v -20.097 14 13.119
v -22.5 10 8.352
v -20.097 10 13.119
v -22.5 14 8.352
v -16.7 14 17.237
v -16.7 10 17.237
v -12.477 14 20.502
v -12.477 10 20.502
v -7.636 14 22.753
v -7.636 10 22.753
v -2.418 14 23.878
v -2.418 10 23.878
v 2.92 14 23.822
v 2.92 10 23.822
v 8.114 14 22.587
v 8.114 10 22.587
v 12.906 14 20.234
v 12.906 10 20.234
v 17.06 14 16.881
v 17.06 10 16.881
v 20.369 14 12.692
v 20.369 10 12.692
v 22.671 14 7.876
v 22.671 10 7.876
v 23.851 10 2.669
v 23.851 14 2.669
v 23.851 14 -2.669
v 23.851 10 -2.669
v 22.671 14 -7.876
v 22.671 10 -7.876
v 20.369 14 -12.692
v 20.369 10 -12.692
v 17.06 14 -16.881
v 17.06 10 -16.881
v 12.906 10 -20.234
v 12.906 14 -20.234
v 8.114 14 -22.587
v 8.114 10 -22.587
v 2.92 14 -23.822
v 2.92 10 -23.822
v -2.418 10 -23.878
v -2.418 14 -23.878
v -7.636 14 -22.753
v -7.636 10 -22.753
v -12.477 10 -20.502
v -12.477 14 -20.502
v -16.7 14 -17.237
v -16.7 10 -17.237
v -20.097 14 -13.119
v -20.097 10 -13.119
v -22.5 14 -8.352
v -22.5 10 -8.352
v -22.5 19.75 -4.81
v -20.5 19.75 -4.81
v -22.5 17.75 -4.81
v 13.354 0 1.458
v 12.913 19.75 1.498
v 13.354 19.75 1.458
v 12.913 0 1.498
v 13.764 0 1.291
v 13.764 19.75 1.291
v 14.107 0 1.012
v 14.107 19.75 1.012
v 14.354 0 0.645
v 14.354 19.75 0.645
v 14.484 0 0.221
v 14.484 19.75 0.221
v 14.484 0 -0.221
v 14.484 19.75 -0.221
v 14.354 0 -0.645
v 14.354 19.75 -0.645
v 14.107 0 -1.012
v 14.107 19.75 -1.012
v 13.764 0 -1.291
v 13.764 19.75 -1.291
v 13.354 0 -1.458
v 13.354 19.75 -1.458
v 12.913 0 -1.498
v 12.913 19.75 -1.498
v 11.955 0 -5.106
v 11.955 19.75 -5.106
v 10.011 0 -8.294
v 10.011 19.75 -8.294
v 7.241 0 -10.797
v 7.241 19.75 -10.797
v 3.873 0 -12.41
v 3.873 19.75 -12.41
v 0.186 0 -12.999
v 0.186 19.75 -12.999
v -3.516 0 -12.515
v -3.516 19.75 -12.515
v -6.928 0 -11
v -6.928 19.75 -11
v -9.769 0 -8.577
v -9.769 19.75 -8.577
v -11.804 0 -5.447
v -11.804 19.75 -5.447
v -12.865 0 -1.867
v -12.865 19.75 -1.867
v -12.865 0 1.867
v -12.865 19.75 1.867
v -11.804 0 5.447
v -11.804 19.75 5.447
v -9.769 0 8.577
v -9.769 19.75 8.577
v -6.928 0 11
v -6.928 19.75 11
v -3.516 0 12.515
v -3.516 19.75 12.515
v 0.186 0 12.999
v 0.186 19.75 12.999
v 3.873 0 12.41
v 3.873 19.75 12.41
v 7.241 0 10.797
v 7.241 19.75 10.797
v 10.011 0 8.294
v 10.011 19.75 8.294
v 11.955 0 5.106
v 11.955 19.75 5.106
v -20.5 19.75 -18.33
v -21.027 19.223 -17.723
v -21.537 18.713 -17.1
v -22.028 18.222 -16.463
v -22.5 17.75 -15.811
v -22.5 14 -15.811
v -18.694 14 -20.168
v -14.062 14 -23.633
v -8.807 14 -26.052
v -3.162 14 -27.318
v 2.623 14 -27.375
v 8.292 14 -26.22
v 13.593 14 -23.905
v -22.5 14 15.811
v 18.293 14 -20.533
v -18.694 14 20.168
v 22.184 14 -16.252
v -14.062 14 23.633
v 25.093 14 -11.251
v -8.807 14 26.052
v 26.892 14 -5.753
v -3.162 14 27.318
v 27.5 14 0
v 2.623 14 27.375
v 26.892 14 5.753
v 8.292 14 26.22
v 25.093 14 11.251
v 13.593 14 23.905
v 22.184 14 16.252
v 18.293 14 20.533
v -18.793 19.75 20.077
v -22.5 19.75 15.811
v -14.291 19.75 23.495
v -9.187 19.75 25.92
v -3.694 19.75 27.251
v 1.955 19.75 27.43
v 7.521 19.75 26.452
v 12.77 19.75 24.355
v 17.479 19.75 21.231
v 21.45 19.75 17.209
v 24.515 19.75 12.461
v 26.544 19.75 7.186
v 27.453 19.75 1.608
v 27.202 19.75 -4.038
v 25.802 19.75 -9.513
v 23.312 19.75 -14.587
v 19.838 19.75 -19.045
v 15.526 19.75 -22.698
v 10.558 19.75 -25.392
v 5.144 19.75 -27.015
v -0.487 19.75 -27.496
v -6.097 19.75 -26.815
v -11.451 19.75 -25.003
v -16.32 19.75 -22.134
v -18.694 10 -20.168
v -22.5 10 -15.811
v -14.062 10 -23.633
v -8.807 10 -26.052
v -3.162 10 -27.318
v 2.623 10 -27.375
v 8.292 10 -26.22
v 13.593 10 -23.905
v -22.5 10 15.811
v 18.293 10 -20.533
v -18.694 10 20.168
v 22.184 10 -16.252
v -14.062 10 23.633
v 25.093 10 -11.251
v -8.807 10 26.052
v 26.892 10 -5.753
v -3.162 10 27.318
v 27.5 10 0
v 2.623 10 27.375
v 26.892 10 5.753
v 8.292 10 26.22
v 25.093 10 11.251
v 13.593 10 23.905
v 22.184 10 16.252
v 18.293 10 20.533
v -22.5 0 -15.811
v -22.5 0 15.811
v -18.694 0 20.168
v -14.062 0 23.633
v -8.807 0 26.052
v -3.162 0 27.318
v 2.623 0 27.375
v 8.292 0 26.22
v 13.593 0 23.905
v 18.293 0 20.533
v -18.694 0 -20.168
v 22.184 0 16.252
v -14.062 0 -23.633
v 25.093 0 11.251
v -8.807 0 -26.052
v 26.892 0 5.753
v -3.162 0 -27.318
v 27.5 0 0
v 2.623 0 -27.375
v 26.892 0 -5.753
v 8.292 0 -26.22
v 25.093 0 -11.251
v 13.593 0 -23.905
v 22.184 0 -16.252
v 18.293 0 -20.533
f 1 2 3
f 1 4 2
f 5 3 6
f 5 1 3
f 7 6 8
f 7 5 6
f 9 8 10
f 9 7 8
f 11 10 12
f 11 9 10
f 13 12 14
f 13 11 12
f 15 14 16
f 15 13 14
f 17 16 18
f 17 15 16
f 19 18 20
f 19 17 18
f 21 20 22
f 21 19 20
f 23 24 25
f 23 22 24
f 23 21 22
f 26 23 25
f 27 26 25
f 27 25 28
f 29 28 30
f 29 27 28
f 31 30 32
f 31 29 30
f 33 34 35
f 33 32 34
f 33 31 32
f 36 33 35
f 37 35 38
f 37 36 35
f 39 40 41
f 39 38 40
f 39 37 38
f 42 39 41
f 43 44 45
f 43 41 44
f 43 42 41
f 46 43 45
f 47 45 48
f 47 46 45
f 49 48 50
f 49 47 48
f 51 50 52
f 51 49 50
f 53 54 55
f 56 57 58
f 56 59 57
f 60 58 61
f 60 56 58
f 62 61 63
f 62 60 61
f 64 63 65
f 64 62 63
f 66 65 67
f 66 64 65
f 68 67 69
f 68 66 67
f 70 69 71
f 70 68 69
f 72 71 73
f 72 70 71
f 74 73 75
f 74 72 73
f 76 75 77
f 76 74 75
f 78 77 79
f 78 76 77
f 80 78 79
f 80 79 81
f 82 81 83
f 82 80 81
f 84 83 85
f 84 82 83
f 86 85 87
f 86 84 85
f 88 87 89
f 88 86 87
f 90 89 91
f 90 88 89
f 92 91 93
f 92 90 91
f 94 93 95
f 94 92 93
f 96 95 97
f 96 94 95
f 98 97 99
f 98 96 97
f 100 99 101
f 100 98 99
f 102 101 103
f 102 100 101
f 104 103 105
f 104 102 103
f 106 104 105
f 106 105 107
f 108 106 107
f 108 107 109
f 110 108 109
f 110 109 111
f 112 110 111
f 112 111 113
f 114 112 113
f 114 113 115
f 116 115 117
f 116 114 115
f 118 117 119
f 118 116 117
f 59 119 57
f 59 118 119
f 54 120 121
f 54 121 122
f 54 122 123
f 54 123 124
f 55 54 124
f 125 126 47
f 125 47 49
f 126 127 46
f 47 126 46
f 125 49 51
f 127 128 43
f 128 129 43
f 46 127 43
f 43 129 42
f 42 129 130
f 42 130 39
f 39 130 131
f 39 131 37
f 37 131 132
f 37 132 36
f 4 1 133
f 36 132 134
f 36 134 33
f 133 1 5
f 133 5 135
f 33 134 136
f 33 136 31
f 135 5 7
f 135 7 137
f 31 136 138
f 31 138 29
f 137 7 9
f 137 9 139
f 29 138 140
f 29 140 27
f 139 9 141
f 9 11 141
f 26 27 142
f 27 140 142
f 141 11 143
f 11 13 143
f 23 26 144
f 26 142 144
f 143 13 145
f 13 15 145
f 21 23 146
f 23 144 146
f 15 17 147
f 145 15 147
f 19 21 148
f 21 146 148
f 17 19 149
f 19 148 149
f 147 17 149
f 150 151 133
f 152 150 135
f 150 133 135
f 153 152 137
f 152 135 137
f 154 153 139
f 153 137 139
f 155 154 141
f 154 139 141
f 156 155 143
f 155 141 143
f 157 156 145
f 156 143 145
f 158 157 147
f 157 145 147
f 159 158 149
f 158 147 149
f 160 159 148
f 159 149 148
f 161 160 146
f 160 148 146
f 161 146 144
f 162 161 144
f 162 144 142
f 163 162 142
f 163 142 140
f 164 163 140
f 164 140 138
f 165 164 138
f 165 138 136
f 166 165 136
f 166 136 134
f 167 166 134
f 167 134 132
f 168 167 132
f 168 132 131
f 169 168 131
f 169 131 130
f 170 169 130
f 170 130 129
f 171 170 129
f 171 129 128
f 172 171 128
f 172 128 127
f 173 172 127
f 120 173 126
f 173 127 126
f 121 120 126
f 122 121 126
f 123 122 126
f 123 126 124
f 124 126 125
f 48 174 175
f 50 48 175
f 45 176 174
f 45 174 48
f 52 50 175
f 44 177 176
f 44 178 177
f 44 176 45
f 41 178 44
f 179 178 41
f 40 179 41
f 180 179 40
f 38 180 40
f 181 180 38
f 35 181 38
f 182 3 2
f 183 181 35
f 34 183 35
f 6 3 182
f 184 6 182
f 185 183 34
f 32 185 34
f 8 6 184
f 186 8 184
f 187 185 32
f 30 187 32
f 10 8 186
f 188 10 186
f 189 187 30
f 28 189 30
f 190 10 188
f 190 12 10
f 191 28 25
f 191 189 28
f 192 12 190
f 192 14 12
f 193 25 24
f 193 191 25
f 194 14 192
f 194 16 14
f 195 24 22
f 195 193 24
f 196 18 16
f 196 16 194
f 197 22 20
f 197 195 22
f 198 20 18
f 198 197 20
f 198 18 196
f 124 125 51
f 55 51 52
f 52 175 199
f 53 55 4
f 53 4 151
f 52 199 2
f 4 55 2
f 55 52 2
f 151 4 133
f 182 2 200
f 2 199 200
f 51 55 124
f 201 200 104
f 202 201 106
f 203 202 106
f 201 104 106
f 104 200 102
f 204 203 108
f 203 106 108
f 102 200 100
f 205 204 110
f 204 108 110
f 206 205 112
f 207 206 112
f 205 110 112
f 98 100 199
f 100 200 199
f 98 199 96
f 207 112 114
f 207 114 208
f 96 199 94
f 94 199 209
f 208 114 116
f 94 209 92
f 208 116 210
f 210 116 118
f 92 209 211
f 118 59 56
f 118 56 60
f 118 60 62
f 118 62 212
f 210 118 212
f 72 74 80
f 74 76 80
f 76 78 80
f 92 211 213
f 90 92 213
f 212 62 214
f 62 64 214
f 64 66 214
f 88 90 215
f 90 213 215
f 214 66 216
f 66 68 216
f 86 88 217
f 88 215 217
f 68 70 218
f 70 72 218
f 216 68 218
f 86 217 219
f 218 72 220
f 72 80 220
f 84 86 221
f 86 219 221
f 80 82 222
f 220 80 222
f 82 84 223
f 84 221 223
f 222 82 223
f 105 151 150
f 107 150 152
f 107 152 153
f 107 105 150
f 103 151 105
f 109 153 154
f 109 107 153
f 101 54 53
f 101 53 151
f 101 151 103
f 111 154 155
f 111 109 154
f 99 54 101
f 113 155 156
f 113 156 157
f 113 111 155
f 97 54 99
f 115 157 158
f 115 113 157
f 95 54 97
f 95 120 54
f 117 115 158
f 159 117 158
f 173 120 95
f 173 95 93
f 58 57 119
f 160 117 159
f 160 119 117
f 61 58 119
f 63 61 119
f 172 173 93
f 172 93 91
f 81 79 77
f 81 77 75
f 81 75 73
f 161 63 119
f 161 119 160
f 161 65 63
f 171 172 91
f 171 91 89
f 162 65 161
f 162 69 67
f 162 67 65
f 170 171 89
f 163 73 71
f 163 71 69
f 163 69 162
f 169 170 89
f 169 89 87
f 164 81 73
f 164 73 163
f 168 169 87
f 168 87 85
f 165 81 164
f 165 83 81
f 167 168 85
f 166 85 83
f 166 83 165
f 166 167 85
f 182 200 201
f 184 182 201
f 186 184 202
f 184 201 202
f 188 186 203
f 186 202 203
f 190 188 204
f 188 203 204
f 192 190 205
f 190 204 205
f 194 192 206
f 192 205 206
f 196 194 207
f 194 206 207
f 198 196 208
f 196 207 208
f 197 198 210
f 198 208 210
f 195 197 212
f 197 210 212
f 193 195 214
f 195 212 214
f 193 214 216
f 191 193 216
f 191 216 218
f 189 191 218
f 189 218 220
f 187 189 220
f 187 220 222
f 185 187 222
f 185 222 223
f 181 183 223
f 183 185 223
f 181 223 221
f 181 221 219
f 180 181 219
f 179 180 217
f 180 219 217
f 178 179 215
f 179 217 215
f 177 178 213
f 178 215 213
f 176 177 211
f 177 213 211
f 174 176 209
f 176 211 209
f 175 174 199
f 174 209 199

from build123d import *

# Parameters (mm, degrees)
EXTRUDE_1_DEPTH     = 19.75
SKETCH_2_R          = 13
CUT_EXTRUDE_2_DEPTH = 20.75
SKETCH_3_W          = 5
SKETCH_3_H          = 4
SKETCH_4_R          = 1.5
CUT_EXTRUDE_3_DEPTH = 20.75
CUT_EXTRUDE_4_DEPTH = 23.69


with BuildPart() as part:
    # Эскиз1 → Бобышка-Вытянуть1 (new body)
    with BuildSketch(Plane(origin=(0, 0, 0), x_dir=(1, 0, 0), z_dir=(0, 1, 0))):
        with BuildLine():
            Line((-22.5, 15.811388301), (-22.5, -15.811388301))
            ThreePointArc((-22.5, -15.811388301), (27.5, 0), (-22.5, 15.811388301))
        make_face()
    extrude(amount=EXTRUDE_1_DEPTH)

    # Эскиз2 → Вырез-Вытянуть2 (cut, through all)
    with BuildSketch(Plane(origin=(0, 0, 0), x_dir=(1, 0, 0), z_dir=(0, 1, 0))):
        Circle(SKETCH_2_R)
    extrude(amount=CUT_EXTRUDE_2_DEPTH, mode=Mode.SUBTRACT)

    # Эскиз3 → Вырез-Повернуть1 (revolve, cut)
    with BuildSketch(Plane(origin=(0, 0, 0), x_dir=(0, 0, -1), z_dir=(1, 0, 0))):
        with Locations((-26.5, 12)):
            Rectangle(SKETCH_3_W, SKETCH_3_H)
    revolve(axis=Axis((0, 0, 0), (0, 1, 0)), mode=Mode.SUBTRACT)

    # Эскиз4 → Вырез-Вытянуть3 (cut, through all)
    with BuildSketch(Plane(origin=(0, 0, 0), x_dir=(1, 0, 0), z_dir=(0, 1, 0))):
        with Locations((13, 0)):
            Circle(SKETCH_4_R)
    extrude(amount=CUT_EXTRUDE_3_DEPTH, mode=Mode.SUBTRACT)

    # Эскиз5 → Вырез-Вытянуть4 (cut, through all)
    with BuildSketch(Plane.XY.offset(-4.81)):
        Polygon((-22.5, 19.75), (-20.5, 19.75), (-22.5, 17.75), align=None)
    extrude(amount=-CUT_EXTRUDE_4_DEPTH, mode=Mode.SUBTRACT)


solid = part.part
